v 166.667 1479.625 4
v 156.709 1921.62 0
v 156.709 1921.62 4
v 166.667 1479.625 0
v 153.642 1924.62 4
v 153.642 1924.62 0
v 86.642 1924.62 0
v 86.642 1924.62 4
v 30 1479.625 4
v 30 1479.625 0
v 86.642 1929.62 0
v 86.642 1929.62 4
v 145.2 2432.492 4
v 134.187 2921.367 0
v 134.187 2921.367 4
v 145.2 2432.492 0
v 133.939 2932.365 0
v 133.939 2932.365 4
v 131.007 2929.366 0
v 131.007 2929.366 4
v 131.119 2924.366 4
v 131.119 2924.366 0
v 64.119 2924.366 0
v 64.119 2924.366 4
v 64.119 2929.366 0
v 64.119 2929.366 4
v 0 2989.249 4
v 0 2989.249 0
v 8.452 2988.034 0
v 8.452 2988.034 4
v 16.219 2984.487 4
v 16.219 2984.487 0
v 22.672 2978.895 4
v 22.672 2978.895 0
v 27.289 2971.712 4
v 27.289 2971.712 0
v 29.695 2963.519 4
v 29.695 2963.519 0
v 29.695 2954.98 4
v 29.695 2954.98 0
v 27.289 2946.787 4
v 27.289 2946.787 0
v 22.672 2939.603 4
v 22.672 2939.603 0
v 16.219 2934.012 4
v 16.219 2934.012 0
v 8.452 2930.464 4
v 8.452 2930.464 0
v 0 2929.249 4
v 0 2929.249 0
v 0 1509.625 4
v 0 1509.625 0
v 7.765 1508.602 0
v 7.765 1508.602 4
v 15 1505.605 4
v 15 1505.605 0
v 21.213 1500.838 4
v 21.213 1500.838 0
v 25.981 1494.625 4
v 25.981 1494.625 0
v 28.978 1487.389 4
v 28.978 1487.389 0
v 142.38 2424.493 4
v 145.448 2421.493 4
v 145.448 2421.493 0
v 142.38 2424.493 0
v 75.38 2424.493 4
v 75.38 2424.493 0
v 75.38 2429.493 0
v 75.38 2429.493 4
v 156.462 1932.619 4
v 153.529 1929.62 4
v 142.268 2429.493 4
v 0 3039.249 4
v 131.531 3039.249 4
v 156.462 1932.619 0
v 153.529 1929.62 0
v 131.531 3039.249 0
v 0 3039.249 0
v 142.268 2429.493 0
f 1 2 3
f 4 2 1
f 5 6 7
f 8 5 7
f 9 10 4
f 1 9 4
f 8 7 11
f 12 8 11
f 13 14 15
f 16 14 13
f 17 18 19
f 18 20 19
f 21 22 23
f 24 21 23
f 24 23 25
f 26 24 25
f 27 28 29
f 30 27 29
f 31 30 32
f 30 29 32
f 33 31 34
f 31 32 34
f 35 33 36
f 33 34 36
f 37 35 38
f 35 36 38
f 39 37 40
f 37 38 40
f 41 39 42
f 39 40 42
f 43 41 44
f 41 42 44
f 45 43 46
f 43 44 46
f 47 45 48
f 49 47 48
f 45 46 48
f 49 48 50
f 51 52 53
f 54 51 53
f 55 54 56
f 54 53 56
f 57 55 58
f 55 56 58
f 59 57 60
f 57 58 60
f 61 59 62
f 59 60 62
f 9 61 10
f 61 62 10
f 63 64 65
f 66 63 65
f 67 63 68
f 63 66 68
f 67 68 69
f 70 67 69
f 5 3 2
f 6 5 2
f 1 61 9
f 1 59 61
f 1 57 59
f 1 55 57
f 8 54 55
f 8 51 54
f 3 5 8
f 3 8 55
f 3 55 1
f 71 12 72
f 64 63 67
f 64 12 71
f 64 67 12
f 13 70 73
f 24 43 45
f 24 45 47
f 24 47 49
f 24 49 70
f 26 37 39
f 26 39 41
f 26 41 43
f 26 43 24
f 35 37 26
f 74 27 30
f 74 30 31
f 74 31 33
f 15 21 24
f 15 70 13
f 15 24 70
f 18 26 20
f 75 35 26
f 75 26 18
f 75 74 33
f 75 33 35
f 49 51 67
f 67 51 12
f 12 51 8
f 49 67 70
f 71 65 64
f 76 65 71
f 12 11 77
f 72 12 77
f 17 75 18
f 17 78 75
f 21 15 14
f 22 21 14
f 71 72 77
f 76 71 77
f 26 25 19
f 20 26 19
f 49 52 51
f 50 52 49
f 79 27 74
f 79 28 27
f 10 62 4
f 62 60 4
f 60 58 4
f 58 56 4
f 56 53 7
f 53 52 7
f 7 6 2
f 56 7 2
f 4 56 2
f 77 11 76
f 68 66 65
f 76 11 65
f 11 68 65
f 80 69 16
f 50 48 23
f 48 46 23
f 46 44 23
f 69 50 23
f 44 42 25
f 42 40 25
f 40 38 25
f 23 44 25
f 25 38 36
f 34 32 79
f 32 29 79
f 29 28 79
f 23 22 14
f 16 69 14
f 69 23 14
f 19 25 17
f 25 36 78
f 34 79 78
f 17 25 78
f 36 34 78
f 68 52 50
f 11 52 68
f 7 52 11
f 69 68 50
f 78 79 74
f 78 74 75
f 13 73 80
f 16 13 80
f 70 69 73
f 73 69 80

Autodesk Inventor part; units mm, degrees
ref_plane "YZ Plane" through (0, 0, 0) normal (1, 0, 0) x (0, 1, 0)
ref_plane "XZ Plane" through (0, 0, 0) normal (0, 1, 0) x (-1, 0, 0)
ref_plane "XY Plane" through (0, 0, 0) normal (0, 0, 1) x (1, 0, 0)
sketch "Sketch1" plane through (0, 0, 0) normal (0, 0, 1) x (1, 0, 0)
  line L0 (0, 0) -> (0, 4438.8737)
  line L1 (0, 4438.8737) -> (100, 4438.8737)
  line L2 (100, 4438.8737) -> (200, 0)
  line L3 (200, 0) -> (0, 0)
  circle A0 centre (0, 0) radius 30
  line L4 (0, 1479.6246) -> (166.6667, 1479.6246)
  line L5 (0, 2959.2492) -> (133.3333, 2959.2492)
  circle A1 centre (0, 1479.6246) radius 30
  circle A2 centre (0, 2959.2492) radius 30
  line L6 (190.4255, 425) -> (120.4255, 425)
  line L7 (120.4255, 425) -> (120.4255, 430)
  line L8 (120.4255, 430) -> (190.4255, 430)
  line L9 (190.4255, 430) -> (190.4255, 425)
  line L10 (109.1642, 929.8732) -> (179.1642, 929.8732)
  line L11 (179.1642, 924.8732) -> (109.1642, 924.8732)
  line L12 (109.1642, 924.8732) -> (109.1642, 929.8732)
  line L13 (179.1642, 929.8732) -> (179.1642, 924.8732)
  line L14 (97.903, 1429.7463) -> (167.903, 1429.7463)
  line L15 (167.903, 1424.7463) -> (97.903, 1424.7463)
  line L16 (97.903, 1424.7463) -> (97.903, 1429.7463)
  line L17 (167.903, 1429.7463) -> (167.903, 1424.7463)
  line L18 (86.6417, 1929.6195) -> (156.6417, 1929.6195)
  line L19 (156.6417, 1924.6195) -> (86.6417, 1924.6195)
  line L20 (86.6417, 1924.6195) -> (86.6417, 1929.6195)
  line L21 (156.6417, 1929.6195) -> (156.6417, 1924.6195)
  line L22 (75.3805, 2429.4927) -> (145.3805, 2429.4927)
  line L23 (145.3805, 2424.4927) -> (75.3805, 2424.4927)
  line L24 (75.3805, 2424.4927) -> (75.3805, 2429.4927)
  line L25 (145.3805, 2429.4927) -> (145.3805, 2424.4927)
  line L26 (64.1192, 2929.3658) -> (134.1192, 2929.3658)
  line L27 (134.1192, 2924.3658) -> (64.1192, 2924.3658)
  line L28 (64.1192, 2924.3658) -> (64.1192, 2929.3658)
  line L29 (134.1192, 2929.3658) -> (134.1192, 2924.3658)
  line L30 (52.8579, 3429.239) -> (122.8579, 3429.239)
  line L31 (122.8579, 3424.239) -> (52.8579, 3424.239)
  line L32 (52.8579, 3424.239) -> (52.8579, 3429.239)
  line L33 (122.8579, 3429.239) -> (122.8579, 3424.239)
  line L34 (41.5967, 3929.1122) -> (111.5967, 3929.1122)
  line L35 (111.5967, 3924.1122) -> (41.5967, 3924.1122)
  line L36 (41.5967, 3924.1122) -> (41.5967, 3929.1122)
  line L37 (111.5967, 3929.1122) -> (111.5967, 3924.1122)
  line L38 (0, 1629.6246) -> (163.2874, 1629.6246)
  line L39 (0, 3039.2492) -> (131.5311, 3039.2492)
  point P0 (30, 2959.2492)
  point P1 (0, 2929.2492)
  point P2 (0, 1509.6246)
  point P3 (0, 1449.6246)
  point P4 (0, 30)
  point P5 (30, 0)
  point P6 (190.3129, 430)
  point P7 (179.0516, 929.8732)
  point P8 (167.7903, 1429.7463)
  point P9 (30, 1479.6246)
  point P10 (156.5291, 1929.6195)
  point P11 (145.2678, 2429.4927)
  point P12 (134.0066, 2929.3658)
  point P13 (0, 2989.2492)
  dimension "d65" = 100
  dimension "d67" = 200
  dimension "d68" = 60
  dimension "d69" = 1480
  dimension "d70" = 1480
  dimension "d71" = 1480
  dimension "d72" = 5
  dimension "d73" = 70
  dimension "d74" = 430
  dimension "d77" = 500
  dimension "d82" = 80
  dimension "d83" = 150
extrude "Plate3" add sketch "Sketch1" along normal blind 4 contours L39 L2 L5 A2 L0 | L5 L2 L26 L28 L27 L22 L24 L23 L18 L20 L19 L38 L0 A2 | L38 L2 L4 A1 L0
chamfer "Corner Chamfer2" distance 3 angle 45 6 edges at (156.6417, 1924.6195, 2) (156.5291, 1929.6195, 2) (145.3805, 2424.4927, 2) (145.2678, 2429.4927, 2) (134.1192, 2924.3658, 2) (134.0066, 2929.3658, 2)
equation "\"BendRadius\" = Thickness"
equation "\"BendReliefWidth\" = Thickness"
equation "\"BendReliefDepth\" = 0.5 * Thickness"
equation "\"CornerReliefSize\" = 4 * Thickness"
equation "\"MinimumRemnant\" = 2 * Thickness"
equation "\"TransitionRadius\" = BendRadius"
equation "\"JacobiRadiusSize\" = BendRadius"
equation "\"GapSize\" = Thickness"
equation "\"Thickness\" = 4"
properties part number "0711 GBK Center rib 2" material "Steel"
